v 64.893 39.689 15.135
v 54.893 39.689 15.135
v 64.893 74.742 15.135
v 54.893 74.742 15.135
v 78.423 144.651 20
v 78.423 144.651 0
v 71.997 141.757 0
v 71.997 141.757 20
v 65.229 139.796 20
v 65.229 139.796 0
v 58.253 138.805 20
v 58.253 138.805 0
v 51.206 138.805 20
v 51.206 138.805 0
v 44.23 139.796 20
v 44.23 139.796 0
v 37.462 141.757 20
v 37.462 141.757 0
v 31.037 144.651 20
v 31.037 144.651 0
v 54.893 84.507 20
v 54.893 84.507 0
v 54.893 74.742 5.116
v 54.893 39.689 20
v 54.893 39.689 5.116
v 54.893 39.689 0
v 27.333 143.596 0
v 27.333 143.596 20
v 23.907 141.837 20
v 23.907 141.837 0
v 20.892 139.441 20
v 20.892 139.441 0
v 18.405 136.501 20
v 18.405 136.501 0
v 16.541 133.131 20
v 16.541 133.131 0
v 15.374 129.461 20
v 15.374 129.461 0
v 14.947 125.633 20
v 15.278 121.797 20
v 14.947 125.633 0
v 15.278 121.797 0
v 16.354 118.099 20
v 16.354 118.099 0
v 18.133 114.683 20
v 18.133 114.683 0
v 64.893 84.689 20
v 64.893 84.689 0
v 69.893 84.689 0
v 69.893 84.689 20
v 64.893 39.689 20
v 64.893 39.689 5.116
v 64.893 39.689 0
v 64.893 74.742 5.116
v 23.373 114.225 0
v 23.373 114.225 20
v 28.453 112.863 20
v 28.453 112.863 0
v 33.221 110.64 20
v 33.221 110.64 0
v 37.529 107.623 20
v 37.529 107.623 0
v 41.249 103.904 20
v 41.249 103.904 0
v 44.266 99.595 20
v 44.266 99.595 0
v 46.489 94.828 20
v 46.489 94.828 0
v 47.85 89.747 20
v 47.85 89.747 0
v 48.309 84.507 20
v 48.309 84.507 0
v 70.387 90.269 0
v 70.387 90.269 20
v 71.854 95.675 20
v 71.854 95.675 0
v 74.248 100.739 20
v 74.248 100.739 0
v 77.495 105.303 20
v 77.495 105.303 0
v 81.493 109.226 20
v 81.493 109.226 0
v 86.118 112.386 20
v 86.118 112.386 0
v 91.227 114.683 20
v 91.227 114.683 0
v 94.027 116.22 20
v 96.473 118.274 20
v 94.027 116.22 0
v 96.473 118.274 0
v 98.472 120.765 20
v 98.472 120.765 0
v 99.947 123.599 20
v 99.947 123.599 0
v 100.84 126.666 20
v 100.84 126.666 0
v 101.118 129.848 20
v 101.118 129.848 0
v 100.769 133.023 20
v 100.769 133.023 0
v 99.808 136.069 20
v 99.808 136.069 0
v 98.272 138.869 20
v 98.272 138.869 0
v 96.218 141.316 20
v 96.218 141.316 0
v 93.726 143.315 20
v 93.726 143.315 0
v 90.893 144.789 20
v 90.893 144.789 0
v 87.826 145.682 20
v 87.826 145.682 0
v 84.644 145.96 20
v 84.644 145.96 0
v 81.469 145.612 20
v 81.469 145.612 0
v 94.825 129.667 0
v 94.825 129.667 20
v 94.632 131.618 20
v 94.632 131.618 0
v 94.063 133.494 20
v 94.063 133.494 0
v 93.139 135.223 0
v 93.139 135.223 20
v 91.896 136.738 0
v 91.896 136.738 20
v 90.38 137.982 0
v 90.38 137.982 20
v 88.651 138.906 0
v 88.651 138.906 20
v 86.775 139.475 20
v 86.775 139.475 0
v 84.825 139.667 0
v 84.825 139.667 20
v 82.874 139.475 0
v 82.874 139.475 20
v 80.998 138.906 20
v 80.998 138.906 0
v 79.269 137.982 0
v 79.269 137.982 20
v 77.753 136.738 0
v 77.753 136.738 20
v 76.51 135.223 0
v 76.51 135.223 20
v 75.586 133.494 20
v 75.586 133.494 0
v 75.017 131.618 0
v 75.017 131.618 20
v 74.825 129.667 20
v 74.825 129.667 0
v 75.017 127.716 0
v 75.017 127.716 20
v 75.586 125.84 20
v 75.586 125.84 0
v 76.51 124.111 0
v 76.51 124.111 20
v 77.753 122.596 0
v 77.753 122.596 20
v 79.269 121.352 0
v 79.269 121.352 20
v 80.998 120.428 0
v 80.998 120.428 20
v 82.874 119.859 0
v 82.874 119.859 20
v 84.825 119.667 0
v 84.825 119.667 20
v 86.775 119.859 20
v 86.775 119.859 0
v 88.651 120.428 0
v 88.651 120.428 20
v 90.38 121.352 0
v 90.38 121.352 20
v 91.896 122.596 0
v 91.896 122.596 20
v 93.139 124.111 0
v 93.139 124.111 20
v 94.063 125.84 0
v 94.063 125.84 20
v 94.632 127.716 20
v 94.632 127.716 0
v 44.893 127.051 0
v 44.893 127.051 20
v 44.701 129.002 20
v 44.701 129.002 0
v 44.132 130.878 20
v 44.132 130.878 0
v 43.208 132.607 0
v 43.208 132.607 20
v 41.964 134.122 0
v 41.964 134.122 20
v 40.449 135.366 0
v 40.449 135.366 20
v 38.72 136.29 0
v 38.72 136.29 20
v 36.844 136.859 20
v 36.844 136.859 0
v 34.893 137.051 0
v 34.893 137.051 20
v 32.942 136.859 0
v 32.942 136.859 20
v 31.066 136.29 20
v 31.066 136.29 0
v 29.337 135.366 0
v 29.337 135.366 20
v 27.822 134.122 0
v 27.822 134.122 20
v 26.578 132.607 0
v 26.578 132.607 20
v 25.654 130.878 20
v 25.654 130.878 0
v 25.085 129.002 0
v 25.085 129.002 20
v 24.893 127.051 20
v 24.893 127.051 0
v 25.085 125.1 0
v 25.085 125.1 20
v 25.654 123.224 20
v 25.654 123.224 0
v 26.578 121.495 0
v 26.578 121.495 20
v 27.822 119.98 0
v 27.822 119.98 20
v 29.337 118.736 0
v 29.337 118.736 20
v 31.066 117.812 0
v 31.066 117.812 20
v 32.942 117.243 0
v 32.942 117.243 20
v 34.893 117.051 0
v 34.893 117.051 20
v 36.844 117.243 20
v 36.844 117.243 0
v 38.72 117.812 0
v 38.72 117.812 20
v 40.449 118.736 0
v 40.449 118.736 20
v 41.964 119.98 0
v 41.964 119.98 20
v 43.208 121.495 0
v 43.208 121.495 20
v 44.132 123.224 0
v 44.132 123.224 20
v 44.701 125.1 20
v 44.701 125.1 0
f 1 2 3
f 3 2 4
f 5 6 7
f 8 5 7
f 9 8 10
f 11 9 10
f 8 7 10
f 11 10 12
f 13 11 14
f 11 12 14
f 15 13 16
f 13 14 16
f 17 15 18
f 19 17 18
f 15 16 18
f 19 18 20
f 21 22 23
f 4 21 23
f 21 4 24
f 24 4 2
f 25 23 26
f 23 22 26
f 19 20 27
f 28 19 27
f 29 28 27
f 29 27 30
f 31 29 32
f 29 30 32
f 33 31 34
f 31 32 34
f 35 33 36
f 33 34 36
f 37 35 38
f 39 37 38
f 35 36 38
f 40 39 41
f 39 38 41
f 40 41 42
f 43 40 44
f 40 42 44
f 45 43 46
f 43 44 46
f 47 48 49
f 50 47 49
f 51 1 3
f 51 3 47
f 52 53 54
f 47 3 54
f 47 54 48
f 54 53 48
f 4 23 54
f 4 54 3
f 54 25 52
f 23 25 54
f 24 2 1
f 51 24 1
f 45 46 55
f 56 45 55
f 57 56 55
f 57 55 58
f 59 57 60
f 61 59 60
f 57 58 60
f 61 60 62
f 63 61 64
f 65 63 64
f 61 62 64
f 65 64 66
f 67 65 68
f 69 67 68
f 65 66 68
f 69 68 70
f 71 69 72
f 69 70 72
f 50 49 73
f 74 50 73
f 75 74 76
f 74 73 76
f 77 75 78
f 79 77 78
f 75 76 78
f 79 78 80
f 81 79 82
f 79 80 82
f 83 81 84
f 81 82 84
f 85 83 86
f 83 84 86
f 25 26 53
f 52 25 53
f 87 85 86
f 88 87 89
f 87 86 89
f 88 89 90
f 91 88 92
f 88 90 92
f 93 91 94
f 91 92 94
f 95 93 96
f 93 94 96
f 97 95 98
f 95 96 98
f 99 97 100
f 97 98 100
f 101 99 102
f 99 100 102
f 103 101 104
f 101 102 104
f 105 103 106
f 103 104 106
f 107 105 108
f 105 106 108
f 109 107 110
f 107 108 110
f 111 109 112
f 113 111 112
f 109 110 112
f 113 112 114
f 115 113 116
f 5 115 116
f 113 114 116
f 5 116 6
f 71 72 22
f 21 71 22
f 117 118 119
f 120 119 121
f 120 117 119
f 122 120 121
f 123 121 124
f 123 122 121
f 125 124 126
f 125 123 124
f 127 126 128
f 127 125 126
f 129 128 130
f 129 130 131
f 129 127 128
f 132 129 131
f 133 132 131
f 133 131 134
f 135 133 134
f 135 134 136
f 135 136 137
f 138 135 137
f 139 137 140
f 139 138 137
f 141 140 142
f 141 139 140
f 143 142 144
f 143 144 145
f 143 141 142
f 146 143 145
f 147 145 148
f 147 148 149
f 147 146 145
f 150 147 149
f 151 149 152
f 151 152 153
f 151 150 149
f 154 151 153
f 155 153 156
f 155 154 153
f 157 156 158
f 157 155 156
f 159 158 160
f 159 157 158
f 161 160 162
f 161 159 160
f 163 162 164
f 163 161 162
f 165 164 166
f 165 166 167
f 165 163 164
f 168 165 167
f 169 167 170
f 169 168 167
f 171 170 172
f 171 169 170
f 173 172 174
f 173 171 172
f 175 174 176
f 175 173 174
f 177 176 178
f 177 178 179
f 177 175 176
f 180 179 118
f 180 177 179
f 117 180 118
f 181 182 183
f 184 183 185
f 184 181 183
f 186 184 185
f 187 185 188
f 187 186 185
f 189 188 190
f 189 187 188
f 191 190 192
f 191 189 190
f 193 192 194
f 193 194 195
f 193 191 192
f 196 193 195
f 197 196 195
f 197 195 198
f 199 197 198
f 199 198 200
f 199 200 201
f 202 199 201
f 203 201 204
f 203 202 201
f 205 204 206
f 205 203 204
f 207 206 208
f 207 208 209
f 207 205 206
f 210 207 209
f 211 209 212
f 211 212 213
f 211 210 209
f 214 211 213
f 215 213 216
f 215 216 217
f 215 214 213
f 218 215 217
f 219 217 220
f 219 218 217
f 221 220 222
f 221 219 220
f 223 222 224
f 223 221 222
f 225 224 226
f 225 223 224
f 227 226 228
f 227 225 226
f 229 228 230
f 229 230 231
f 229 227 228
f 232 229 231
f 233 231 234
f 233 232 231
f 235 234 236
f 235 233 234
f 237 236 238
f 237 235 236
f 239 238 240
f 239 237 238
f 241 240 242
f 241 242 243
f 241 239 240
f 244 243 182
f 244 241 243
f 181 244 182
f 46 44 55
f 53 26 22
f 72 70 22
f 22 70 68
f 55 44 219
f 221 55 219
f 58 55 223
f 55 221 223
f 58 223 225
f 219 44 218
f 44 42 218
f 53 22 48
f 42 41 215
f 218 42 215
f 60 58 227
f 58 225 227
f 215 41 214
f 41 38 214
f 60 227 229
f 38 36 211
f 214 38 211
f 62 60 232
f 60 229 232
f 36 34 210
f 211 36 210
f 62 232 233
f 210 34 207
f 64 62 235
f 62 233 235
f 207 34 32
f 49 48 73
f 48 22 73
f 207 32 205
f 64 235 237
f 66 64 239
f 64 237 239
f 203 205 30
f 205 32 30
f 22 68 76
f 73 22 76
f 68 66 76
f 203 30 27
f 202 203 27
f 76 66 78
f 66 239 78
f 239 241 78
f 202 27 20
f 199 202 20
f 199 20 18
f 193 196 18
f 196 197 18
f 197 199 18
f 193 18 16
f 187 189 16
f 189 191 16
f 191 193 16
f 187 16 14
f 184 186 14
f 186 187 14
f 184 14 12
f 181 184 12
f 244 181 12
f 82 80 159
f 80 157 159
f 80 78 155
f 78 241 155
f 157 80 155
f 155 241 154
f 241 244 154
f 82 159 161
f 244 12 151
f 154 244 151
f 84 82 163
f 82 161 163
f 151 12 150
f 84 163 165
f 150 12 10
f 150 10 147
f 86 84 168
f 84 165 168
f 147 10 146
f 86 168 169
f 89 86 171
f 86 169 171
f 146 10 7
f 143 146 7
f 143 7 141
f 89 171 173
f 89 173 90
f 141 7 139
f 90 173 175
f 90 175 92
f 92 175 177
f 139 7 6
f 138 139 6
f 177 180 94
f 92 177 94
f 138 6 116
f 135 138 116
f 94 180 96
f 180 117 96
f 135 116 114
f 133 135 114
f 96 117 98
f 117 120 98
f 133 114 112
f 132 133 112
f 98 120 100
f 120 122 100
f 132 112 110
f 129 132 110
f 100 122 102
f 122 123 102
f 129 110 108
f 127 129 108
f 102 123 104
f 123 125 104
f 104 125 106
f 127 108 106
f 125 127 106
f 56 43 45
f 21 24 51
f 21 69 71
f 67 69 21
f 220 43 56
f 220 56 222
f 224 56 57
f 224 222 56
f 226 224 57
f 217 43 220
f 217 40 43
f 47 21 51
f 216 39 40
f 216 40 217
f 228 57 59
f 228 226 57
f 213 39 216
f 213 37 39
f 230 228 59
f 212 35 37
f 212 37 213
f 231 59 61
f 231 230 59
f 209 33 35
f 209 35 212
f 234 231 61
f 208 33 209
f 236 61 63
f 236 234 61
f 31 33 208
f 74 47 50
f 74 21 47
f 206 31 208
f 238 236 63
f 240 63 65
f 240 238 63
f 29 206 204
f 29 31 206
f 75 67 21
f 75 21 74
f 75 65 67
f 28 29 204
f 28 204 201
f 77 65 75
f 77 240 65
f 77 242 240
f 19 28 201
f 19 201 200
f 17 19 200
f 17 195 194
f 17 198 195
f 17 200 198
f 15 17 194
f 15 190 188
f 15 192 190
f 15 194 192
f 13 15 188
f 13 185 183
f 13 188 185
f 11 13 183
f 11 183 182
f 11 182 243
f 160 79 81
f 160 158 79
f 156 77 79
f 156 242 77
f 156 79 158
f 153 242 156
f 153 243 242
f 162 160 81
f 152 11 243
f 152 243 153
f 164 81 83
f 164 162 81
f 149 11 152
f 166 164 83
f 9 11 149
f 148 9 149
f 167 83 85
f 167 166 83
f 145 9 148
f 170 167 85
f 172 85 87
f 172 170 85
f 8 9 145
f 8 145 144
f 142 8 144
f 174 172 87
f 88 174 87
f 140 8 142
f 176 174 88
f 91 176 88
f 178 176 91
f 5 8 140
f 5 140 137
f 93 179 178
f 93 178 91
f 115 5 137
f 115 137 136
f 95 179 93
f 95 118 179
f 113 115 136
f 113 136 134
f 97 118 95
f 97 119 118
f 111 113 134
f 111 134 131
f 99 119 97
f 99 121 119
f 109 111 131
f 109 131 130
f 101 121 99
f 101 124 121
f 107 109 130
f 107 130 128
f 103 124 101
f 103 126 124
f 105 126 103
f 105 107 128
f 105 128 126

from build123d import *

# Parameters (mm, degrees)
SKETCH21_R           = 10
BOSS_EXTRUDE20_DEPTH = 20
SKETCH24_W           = 10.018971209
SKETCH24_H           = 35.052940056
CUT_EXTRUDE10_DEPTH  = 20


with BuildPart() as part:
    # Sketch21 → Boss-Extrude20 (new body)
    with BuildSketch(Plane.XY):
        with BuildLine():
            Line((54.893048592, 39.689392996), (64.893048592, 39.689392996))
            Line((64.893048592, 39.689392996), (64.893048592, 84.689392996))
            Line((64.893048592, 84.689392996), (69.893048592, 84.689392996))
            ThreePointArc((69.893048592, 84.689392996), (75.770400953, 103.092850807), (91.226612731, 114.683193669))
            ThreePointArc((91.226612731, 114.683193669), (99.80843011, 136.069116434), (78.422507345, 144.650933813))
            ThreePointArc((78.422507345, 144.650933813), (54.7296652, 138.68102842), (31.036823055, 144.650933813))
            ThreePointArc((31.036823055, 144.650933813), (16.541386166, 133.13054606), (18.132679452, 114.683193669))
            ThreePointArc((18.132679452, 114.683193669), (39.470310291, 105.844857587), (48.308646374, 84.507226748))
            Line((48.308646374, 84.507226748), (54.893048592, 84.507226748))
            Line((54.893048592, 84.507226748), (54.893048592, 39.689392996))
        make_face()
        with Locations((84.824560038, 129.667063741)):
            Circle(SKETCH21_R, mode=Mode.SUBTRACT)
        with Locations((34.893048592, 127.050928279)):
            Circle(SKETCH21_R, mode=Mode.SUBTRACT)
    extrude(amount=BOSS_EXTRUDE20_DEPTH)

    # Sketch24 → Cut-Extrude10 (cut)
    with BuildSketch(Plane.ZY.offset(-54.893048592)):
        with Locations((10.125179514, 57.215863024)):
            Rectangle(SKETCH24_W, SKETCH24_H)
    extrude(amount=-CUT_EXTRUDE10_DEPTH, mode=Mode.SUBTRACT)


solid = part.part
